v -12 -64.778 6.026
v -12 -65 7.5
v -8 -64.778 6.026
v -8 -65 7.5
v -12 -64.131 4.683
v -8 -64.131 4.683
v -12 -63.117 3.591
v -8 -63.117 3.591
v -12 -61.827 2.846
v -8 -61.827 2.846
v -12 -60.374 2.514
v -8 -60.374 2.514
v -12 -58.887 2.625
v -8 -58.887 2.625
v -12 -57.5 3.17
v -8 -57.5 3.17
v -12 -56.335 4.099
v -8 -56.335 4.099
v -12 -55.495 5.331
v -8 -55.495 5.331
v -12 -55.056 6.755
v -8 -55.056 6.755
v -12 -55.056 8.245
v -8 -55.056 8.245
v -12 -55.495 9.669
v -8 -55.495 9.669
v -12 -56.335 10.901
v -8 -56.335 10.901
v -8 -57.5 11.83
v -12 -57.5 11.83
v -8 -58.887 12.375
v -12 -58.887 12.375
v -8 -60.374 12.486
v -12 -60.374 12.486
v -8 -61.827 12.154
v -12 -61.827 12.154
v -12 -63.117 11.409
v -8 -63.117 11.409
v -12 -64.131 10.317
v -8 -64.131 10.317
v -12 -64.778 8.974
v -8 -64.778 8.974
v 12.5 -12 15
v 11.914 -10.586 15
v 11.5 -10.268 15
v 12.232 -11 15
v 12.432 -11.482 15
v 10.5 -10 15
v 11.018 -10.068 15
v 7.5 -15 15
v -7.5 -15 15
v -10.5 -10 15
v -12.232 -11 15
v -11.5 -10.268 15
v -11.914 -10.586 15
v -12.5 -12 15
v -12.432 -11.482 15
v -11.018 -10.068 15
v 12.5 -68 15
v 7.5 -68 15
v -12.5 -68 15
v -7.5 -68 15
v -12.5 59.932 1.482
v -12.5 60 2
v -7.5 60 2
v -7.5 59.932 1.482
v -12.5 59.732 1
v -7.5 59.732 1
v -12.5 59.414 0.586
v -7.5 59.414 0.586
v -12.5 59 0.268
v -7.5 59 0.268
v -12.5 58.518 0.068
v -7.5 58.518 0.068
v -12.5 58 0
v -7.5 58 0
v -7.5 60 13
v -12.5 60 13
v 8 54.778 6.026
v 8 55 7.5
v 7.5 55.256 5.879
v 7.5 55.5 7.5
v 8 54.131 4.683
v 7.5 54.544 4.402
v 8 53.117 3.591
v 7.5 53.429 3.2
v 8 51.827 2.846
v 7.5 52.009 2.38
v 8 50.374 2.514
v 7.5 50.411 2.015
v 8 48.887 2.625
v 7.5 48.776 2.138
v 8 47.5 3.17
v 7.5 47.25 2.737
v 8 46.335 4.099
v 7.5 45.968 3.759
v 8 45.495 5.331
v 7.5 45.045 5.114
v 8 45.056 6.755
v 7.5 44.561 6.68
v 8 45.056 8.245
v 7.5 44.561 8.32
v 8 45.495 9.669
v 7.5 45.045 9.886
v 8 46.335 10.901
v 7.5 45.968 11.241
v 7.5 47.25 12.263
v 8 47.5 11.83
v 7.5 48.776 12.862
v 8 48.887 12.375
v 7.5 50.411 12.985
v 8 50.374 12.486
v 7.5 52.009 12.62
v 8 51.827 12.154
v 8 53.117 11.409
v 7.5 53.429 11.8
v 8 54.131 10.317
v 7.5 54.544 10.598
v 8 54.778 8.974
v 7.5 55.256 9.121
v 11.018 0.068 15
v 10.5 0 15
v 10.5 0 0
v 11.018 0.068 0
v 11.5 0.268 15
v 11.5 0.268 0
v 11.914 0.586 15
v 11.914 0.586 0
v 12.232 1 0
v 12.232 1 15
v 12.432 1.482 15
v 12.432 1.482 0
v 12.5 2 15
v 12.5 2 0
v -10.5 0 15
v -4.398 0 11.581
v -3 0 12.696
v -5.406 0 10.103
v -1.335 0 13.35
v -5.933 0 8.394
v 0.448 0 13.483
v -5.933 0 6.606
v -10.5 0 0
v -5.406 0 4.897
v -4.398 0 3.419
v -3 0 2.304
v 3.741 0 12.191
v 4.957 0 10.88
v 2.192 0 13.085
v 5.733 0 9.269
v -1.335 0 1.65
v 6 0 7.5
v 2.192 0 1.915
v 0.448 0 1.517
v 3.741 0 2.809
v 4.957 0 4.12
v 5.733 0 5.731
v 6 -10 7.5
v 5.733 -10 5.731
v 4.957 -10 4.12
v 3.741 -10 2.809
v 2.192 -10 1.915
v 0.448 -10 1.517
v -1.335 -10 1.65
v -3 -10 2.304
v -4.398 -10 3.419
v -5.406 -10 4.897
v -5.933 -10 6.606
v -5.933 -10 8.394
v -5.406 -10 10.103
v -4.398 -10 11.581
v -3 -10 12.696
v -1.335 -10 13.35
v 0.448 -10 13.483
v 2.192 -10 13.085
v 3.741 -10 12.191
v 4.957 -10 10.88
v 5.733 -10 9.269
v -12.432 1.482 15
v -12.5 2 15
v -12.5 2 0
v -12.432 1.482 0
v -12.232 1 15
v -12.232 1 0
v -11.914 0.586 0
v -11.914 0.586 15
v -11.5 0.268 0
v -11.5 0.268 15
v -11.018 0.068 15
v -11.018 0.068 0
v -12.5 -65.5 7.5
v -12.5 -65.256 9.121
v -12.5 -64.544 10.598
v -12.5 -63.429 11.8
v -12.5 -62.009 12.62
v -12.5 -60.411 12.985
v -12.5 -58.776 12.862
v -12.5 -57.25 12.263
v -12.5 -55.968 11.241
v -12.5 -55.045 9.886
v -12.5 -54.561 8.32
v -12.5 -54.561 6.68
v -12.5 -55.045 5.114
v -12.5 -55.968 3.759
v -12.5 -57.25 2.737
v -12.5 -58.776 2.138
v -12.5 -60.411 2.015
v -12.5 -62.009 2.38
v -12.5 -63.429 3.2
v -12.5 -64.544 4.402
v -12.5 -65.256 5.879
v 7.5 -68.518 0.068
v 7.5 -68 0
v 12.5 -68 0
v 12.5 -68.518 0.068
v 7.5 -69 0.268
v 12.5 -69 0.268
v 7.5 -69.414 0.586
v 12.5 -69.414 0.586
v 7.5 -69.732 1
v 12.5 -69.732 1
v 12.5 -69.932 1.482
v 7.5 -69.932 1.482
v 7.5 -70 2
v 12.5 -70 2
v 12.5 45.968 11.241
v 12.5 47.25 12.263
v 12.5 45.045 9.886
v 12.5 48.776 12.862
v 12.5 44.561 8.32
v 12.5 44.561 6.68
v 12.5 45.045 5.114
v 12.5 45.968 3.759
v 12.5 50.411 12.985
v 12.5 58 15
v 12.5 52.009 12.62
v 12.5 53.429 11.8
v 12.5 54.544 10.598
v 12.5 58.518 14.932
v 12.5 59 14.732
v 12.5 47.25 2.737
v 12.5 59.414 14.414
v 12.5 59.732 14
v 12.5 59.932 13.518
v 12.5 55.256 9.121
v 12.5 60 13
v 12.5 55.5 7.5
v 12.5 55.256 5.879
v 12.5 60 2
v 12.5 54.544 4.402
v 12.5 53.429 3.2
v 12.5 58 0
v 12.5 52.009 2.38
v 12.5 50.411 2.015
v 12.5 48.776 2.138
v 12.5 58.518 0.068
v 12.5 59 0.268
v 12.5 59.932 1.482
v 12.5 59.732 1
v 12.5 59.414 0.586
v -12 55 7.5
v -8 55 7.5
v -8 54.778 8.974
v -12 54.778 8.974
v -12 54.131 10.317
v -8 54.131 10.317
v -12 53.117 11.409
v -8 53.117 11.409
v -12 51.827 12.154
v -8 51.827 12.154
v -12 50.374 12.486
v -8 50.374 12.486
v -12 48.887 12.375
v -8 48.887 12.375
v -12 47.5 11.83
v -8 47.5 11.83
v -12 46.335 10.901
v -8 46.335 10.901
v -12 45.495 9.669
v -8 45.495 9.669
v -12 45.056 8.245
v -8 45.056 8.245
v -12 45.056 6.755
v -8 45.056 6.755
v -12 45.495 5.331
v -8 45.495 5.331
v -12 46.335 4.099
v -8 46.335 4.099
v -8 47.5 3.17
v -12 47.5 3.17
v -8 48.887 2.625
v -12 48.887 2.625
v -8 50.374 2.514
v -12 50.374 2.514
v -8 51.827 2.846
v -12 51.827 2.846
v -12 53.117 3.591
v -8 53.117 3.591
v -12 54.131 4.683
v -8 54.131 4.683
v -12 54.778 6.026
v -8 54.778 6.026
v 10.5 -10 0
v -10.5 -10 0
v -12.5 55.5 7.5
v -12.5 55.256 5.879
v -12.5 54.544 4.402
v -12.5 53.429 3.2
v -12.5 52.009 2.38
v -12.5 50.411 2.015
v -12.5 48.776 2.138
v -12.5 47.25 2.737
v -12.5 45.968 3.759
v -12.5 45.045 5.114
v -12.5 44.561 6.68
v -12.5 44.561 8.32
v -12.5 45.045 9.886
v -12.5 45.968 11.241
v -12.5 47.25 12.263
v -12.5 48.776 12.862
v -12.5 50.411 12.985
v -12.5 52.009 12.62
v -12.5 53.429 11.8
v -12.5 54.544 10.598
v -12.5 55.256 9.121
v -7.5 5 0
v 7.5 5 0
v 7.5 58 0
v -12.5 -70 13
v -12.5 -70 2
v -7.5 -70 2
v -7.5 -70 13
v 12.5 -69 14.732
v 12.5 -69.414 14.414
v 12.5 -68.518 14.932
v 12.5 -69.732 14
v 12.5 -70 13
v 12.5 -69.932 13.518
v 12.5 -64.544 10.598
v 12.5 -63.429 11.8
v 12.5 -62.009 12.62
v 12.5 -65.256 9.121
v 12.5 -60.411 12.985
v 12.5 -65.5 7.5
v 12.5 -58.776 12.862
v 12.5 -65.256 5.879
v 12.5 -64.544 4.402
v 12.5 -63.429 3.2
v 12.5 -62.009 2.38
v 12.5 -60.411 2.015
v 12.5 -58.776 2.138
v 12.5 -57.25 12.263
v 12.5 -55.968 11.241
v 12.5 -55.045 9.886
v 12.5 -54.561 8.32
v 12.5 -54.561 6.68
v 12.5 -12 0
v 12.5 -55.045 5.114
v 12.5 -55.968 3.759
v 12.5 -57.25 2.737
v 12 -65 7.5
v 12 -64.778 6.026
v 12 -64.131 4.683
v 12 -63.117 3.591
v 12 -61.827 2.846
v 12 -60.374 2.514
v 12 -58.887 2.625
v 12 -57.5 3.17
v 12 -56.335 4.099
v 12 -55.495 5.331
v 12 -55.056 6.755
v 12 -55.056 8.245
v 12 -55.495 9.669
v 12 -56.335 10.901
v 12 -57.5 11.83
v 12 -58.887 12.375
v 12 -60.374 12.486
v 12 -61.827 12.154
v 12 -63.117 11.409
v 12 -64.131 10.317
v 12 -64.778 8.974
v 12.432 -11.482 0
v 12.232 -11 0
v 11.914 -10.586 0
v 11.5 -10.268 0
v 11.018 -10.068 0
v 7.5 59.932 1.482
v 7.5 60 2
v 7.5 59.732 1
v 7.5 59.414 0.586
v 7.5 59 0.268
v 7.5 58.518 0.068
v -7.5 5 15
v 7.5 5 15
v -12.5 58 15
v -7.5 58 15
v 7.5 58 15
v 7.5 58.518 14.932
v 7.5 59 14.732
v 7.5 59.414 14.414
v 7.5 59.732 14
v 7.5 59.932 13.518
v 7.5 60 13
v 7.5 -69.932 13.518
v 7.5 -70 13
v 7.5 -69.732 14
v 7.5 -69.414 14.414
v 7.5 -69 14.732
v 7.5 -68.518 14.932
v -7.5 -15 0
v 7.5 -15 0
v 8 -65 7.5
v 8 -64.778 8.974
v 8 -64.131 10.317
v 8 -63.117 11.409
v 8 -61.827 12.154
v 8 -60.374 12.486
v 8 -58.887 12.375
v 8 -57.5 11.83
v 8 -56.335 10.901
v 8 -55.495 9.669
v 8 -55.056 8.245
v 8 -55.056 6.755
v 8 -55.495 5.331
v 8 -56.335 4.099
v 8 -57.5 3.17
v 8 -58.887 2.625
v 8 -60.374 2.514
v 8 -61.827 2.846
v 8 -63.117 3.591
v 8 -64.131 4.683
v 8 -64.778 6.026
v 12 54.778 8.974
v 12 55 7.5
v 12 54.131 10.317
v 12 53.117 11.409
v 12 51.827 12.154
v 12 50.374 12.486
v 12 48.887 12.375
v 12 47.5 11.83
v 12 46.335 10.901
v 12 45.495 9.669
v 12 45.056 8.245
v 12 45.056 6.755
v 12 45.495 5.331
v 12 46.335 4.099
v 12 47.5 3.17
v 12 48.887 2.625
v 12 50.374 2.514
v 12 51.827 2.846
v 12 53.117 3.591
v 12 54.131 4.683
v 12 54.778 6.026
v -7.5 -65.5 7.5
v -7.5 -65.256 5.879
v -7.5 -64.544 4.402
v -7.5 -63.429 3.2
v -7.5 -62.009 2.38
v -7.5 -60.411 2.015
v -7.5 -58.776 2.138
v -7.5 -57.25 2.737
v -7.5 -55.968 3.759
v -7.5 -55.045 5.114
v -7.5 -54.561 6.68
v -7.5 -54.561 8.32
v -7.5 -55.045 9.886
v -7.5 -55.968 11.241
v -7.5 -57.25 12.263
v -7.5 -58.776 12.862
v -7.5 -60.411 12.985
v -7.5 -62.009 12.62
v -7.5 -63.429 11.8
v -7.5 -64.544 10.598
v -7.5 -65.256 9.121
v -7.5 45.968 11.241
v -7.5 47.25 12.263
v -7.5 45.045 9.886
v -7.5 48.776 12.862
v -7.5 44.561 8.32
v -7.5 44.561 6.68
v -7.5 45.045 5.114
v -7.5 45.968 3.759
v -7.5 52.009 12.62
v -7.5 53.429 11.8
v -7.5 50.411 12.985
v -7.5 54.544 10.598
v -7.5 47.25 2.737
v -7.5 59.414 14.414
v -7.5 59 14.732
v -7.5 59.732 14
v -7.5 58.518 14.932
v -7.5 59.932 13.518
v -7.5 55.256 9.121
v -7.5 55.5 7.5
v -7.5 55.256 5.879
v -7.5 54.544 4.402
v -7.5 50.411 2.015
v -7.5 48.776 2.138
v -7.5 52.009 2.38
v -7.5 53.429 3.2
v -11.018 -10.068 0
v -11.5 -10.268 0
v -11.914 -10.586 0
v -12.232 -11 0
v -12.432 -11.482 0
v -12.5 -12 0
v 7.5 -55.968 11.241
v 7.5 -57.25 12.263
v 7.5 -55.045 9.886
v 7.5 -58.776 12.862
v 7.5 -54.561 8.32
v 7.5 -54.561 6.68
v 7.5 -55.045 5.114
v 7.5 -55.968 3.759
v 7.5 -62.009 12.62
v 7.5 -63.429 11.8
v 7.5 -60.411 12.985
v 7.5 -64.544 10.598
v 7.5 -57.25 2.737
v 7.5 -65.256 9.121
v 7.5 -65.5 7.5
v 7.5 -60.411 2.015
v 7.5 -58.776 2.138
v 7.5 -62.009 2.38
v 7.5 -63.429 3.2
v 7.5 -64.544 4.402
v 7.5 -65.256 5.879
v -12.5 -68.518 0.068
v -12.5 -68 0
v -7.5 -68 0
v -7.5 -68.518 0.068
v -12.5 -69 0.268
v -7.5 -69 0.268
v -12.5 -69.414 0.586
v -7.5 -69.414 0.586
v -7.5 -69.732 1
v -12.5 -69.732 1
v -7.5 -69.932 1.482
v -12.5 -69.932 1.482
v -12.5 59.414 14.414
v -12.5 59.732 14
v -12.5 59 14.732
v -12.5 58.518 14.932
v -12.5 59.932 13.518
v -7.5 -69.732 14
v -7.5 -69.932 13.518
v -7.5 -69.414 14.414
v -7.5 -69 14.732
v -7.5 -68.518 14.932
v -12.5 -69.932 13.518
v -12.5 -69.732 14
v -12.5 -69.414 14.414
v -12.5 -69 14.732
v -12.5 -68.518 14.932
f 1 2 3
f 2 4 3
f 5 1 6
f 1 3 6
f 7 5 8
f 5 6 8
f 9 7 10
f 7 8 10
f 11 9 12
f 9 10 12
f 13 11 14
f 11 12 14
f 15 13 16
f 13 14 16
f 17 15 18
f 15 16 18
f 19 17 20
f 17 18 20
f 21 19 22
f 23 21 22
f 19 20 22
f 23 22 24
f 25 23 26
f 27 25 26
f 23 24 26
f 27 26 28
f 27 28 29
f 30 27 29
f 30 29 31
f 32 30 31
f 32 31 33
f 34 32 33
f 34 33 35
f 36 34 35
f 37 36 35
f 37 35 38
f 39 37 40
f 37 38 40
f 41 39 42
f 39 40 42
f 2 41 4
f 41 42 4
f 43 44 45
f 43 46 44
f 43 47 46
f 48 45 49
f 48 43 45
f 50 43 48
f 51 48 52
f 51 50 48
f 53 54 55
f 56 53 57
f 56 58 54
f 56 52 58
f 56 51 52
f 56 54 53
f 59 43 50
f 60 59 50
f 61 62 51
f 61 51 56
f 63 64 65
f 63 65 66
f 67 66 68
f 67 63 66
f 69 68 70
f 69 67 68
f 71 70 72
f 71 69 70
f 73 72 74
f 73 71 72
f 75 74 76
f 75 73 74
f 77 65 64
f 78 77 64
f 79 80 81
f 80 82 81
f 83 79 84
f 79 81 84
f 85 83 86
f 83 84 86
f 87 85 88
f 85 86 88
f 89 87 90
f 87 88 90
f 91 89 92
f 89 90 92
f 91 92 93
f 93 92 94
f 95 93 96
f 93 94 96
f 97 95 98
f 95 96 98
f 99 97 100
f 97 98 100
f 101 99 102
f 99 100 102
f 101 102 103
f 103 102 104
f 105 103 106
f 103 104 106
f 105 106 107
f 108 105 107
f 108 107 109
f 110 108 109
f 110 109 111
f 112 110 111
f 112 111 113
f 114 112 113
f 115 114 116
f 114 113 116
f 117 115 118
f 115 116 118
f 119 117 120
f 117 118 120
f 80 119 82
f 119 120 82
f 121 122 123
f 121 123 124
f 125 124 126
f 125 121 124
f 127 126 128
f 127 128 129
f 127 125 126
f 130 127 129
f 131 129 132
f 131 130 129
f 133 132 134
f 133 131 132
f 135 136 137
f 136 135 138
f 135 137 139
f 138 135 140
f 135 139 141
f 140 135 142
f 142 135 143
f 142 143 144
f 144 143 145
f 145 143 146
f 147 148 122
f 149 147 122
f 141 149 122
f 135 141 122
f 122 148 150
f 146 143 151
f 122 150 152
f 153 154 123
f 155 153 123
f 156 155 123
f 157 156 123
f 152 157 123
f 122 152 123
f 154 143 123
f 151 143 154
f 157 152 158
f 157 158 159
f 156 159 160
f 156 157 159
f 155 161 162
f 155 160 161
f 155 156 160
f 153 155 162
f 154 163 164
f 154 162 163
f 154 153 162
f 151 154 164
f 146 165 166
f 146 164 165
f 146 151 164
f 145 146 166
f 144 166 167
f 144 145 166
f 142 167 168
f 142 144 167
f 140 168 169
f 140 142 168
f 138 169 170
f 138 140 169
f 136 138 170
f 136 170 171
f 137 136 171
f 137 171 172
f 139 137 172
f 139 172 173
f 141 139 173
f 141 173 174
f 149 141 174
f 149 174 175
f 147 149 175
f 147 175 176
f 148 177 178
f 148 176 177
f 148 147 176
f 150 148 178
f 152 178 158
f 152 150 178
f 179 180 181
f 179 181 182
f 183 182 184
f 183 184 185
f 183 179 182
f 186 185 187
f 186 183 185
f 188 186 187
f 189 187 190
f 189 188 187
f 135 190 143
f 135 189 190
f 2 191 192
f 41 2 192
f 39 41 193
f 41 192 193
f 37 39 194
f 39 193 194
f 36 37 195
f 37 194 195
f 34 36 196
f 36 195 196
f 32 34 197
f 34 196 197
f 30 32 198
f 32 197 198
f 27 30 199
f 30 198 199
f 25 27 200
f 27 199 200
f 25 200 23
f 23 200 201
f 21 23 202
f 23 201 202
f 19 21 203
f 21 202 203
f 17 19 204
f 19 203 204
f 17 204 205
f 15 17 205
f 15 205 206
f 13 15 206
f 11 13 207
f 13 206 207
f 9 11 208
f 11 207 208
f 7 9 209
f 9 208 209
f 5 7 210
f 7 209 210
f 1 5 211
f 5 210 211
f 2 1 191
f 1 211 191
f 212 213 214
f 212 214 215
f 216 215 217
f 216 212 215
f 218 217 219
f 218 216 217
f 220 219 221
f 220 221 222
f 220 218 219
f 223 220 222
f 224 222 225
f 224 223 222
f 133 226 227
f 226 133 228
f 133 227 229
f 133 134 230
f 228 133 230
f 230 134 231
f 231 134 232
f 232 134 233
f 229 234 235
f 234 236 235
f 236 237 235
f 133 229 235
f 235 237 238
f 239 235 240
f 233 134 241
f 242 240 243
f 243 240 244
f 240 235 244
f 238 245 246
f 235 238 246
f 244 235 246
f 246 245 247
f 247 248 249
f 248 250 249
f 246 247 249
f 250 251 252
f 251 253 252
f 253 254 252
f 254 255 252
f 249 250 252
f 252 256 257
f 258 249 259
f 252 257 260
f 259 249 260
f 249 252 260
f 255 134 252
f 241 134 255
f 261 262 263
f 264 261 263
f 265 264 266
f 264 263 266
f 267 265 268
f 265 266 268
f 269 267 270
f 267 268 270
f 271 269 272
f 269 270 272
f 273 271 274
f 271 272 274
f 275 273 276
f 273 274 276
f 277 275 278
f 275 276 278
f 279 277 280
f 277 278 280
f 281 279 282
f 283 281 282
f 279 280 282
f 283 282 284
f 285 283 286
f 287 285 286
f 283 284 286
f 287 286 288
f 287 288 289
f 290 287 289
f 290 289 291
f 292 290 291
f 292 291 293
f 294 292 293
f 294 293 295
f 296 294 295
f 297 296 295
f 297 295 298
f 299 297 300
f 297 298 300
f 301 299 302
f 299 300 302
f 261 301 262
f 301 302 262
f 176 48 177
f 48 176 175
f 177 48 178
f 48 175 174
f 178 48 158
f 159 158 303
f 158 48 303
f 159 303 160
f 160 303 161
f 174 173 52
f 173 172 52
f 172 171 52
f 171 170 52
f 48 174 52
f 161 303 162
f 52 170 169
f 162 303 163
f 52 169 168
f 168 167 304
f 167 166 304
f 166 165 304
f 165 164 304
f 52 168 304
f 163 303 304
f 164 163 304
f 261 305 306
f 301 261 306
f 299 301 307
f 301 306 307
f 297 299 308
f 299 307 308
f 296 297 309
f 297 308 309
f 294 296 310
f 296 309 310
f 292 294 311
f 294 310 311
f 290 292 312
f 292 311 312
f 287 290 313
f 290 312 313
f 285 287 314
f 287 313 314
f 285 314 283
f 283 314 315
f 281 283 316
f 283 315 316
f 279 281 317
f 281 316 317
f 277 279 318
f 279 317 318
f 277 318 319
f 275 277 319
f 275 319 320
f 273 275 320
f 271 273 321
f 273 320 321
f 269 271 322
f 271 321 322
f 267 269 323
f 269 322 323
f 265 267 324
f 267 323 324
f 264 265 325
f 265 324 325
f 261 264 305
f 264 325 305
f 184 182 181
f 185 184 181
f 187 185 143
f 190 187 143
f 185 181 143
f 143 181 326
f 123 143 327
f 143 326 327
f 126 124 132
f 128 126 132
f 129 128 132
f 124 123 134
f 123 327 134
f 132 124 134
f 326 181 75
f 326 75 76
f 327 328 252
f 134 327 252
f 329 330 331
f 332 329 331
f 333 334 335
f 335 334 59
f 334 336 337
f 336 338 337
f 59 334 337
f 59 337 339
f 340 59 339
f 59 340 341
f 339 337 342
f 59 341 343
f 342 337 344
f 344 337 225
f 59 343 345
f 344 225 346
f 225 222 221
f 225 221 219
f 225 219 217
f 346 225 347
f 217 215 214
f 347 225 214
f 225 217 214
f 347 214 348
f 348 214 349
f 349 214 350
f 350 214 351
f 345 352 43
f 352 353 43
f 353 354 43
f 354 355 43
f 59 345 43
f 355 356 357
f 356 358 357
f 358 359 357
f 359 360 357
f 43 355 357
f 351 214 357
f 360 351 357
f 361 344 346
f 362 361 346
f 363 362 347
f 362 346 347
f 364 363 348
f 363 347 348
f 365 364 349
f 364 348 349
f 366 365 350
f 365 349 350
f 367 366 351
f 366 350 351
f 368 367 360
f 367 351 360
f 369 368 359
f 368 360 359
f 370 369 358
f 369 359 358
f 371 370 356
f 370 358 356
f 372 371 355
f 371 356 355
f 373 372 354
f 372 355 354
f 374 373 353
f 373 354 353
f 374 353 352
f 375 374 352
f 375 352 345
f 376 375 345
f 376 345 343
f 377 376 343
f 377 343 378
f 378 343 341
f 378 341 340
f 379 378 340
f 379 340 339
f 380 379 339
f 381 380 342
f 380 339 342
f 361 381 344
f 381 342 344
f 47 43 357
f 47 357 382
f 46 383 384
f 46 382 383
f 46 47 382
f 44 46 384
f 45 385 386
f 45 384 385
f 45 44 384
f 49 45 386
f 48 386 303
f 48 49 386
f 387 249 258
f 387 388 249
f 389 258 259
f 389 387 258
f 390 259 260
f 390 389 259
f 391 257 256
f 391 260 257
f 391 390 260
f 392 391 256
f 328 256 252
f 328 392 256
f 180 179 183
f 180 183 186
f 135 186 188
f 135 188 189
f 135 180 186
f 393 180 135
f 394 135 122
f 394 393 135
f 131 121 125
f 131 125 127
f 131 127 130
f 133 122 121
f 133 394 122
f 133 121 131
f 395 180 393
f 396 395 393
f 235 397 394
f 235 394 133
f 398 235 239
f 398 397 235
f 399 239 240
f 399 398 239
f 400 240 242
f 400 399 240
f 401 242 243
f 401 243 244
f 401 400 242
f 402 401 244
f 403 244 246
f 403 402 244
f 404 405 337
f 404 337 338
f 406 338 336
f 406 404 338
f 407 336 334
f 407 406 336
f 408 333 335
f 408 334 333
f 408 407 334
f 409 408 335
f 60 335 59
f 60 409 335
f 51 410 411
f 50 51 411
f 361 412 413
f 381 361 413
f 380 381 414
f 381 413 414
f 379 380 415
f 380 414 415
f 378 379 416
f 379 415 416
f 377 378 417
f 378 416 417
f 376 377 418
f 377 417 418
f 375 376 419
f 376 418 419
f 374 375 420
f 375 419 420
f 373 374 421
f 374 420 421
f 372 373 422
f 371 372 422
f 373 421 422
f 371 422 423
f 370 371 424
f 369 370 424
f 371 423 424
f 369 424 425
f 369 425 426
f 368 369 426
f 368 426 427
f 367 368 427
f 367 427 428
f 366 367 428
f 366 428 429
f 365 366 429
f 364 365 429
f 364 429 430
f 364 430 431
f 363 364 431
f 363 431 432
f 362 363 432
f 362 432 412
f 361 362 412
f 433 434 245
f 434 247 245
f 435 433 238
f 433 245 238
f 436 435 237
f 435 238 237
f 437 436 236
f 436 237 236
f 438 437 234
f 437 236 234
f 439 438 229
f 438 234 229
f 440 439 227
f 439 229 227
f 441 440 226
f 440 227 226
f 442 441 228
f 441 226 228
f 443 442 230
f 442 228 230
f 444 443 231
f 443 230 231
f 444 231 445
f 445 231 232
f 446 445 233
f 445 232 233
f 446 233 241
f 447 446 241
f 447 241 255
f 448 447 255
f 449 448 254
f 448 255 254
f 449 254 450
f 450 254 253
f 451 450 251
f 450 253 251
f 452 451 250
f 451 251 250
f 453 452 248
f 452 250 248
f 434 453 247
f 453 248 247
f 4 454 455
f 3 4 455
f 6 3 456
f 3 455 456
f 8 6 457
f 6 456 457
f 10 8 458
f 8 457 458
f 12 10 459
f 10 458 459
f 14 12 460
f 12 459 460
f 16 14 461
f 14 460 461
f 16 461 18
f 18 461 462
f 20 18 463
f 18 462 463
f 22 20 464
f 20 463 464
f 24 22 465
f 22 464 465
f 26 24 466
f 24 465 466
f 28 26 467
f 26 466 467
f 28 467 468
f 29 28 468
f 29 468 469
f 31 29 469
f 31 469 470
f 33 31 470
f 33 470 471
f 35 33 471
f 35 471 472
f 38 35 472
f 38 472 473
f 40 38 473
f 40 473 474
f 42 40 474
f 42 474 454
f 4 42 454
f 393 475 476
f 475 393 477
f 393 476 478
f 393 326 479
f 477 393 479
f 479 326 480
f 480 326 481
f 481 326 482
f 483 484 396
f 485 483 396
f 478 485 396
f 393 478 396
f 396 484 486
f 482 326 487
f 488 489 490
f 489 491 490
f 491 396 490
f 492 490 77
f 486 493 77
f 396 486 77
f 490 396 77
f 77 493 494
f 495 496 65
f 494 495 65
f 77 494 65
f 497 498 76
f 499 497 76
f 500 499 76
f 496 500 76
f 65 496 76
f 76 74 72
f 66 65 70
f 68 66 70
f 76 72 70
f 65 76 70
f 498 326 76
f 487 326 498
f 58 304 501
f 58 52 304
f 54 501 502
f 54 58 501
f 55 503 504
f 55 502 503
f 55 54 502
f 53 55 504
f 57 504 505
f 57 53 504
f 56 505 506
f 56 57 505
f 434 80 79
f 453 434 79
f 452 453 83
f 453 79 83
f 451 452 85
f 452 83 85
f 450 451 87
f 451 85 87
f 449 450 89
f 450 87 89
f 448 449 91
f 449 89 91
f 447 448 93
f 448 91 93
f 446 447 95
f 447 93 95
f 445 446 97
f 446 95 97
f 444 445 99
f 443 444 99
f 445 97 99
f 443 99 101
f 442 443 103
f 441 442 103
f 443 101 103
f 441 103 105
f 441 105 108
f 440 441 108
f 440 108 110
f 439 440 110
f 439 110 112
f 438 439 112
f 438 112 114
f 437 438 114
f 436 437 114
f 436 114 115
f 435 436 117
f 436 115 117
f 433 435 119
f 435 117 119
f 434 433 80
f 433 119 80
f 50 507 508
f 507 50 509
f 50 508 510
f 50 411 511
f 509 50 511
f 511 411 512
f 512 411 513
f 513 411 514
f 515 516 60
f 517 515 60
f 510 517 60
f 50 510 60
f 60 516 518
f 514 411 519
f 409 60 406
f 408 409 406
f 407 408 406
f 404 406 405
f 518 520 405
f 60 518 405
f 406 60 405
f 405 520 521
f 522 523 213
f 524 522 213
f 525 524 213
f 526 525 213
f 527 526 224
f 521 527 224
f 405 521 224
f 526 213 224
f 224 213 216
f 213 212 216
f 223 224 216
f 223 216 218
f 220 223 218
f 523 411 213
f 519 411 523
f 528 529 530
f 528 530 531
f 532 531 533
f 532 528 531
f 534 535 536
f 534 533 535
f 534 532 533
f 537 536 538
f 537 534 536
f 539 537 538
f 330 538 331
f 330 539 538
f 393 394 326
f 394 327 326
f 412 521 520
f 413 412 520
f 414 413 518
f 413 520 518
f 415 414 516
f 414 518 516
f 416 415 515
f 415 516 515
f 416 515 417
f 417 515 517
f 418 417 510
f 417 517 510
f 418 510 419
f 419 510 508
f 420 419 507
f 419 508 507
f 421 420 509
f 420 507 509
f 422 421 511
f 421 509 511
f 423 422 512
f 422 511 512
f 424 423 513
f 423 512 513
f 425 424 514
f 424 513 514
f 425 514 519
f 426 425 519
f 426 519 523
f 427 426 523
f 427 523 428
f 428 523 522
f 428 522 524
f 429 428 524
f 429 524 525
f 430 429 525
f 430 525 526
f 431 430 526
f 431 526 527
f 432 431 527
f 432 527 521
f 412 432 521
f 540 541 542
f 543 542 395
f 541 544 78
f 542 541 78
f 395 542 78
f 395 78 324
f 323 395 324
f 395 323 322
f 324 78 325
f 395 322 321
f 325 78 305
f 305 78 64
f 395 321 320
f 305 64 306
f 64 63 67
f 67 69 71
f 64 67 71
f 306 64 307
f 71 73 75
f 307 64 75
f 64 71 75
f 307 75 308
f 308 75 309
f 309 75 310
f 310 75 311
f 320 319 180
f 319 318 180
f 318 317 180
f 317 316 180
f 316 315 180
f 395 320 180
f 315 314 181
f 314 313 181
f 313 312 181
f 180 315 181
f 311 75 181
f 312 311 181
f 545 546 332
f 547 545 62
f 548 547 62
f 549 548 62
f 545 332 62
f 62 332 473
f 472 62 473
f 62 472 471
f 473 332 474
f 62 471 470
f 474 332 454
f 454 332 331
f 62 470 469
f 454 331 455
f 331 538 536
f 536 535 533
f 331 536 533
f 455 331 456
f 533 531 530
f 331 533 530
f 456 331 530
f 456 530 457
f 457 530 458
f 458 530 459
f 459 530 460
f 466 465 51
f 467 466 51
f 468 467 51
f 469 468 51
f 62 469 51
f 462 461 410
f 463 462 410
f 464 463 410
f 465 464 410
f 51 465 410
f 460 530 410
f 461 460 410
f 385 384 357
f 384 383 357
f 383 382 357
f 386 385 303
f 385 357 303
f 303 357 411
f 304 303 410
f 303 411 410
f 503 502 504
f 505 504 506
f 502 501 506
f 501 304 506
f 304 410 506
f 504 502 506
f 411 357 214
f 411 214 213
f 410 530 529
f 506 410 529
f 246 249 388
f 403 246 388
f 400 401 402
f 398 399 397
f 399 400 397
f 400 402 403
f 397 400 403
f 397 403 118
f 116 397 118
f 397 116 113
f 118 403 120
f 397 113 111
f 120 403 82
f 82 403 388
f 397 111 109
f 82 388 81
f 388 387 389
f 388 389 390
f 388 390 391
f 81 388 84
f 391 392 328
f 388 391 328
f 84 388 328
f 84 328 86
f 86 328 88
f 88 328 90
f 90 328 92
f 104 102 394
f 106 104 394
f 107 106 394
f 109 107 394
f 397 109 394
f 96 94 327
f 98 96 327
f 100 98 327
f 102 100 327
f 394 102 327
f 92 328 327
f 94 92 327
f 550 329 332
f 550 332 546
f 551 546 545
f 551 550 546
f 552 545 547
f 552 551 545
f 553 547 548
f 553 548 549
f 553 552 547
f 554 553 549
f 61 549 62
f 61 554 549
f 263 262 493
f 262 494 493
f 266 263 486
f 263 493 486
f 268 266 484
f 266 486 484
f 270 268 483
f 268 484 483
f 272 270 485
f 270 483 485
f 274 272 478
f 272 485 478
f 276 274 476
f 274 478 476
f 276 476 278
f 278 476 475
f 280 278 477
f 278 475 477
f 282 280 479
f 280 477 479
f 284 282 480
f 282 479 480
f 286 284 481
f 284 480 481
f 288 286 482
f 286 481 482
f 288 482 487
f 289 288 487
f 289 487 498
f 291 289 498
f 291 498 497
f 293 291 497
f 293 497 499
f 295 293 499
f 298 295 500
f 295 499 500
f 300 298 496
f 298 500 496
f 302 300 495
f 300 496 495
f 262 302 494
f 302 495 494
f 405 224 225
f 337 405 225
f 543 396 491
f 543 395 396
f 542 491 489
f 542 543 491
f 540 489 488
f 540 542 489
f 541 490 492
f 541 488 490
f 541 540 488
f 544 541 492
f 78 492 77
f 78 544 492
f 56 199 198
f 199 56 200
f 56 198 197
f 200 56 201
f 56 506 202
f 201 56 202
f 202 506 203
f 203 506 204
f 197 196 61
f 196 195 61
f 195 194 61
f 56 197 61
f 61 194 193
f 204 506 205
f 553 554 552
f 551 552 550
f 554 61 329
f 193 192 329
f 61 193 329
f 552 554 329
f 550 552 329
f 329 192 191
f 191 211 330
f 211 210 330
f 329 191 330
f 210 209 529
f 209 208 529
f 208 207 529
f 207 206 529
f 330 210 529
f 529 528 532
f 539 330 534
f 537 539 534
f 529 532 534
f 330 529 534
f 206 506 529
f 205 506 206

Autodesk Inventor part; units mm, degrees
ref_plane "YZ Plane" through (0, 0, 0) normal (1, 0, 0) x (0, 1, 0)
ref_plane "XZ Plane" through (0, 0, 0) normal (0, 1, 0) x (-1, 0, 0)
sketch "Schizzo1" plane through (0, 0, 0) normal (0, 0, 1) x (1, 0, 0)
  line L0 (-12.5, 60) -> (-12.5, 0)
  line L1 (-12.5, 0) -> (12.5, 0)
  line L2 (12.5, 0) -> (12.5, 60)
  line L3 (12.5, 60) -> (7.5, 60)
  line L4 (7.5, 60) -> (7.5, 5)
  line L5 (7.5, 5) -> (-7.5, 5)
  line L6 (-7.5, 5) -> (-7.5, 60)
  line L7 (-7.5, 60) -> (-12.5, 60)
  point P0 (0, 0)
  point P1 (0, 5)
  point P2 (0, 0)
  dimension "d0" = 25
  dimension "d1" = 15
  dimension "d2" = 5
  dimension "d3" = 60
extrude "Estrusione1" add sketch "Schizzo1" along normal blind 15
sketch "Schizzo2" plane through (0, 0, 0) normal (1, 0, 0) x (0, 1, 0)
  line L0 (5, 0) -> (60, 0) projected
  line L1 (60, 0) -> (60, 15) projected
  line L2 (5, 15) -> (60, 15) projected
  line L3 (5, 0) -> (5, 15) projected
  circle A0 centre (50, 7.5) radius 5
  point P0 (0, 0)
  point P1 (60, 7.5)
  point P2 (32.5, 0)
  dimension "d6" = 10
  dimension "d28" = 10
extrude "Estrusione2" cut sketch "Schizzo2" along normal through all both and the other way through all contours A0
fillet "Raccordo1" radius 2 6 edges at (-10, 60, 15) (-10, 60, 0) (10, 60, 15) (10, 60, 0) (12.5, 0, 7.5) (-12.5, 0, 7.5)
sketch "Schizzo3" plane through (-10.5, 0, 0) normal (0, -1, 0) x (1, 0, 0)
  line L0 (0, 0) -> (0, 15) projected
  line L1 (0, 0) -> (21, 0) projected
  line L2 (21, 15) -> (21, 0) projected
  line L3 (0, 15) -> (21, 15) projected
  circle A0 centre (10.5, 7.5) radius 6
  point P0 (10.5, 0)
  point P1 (21, 7.5)
  point P2 (10.5, 0)
  dimension "d13" = 12
extrude "Estrusione3" add sketch "Schizzo3" along normal blind 10 contours A0
ref_plane "Mezzeria" through (0, -5, 7.5) normal (0, -1, 0) x (1, 0, 0)
mirror "Specchio2" about plane through (0, -5, 7.5) normal (0, -1, 0) of "Estrusione1"
mirror "Specchio3" about plane through (0, -5, 7.5) normal (0, -1, 0) of "Estrusione2", "Raccordo1"
chamfer "Smusso1" distance 0.5 angle 45 8 edges at (-7.5, 45, 7.5) (7.5, 45, 7.5) (-12.5, 45, 7.5) (12.5, 45, 7.5) (12.5, -55, 7.5) (7.5, -55, 7.5) (-7.5, -55, 7.5) (-12.5, -55, 7.5)
properties part number "Forcella movimento lama" material "Acciaio inossidabile"
